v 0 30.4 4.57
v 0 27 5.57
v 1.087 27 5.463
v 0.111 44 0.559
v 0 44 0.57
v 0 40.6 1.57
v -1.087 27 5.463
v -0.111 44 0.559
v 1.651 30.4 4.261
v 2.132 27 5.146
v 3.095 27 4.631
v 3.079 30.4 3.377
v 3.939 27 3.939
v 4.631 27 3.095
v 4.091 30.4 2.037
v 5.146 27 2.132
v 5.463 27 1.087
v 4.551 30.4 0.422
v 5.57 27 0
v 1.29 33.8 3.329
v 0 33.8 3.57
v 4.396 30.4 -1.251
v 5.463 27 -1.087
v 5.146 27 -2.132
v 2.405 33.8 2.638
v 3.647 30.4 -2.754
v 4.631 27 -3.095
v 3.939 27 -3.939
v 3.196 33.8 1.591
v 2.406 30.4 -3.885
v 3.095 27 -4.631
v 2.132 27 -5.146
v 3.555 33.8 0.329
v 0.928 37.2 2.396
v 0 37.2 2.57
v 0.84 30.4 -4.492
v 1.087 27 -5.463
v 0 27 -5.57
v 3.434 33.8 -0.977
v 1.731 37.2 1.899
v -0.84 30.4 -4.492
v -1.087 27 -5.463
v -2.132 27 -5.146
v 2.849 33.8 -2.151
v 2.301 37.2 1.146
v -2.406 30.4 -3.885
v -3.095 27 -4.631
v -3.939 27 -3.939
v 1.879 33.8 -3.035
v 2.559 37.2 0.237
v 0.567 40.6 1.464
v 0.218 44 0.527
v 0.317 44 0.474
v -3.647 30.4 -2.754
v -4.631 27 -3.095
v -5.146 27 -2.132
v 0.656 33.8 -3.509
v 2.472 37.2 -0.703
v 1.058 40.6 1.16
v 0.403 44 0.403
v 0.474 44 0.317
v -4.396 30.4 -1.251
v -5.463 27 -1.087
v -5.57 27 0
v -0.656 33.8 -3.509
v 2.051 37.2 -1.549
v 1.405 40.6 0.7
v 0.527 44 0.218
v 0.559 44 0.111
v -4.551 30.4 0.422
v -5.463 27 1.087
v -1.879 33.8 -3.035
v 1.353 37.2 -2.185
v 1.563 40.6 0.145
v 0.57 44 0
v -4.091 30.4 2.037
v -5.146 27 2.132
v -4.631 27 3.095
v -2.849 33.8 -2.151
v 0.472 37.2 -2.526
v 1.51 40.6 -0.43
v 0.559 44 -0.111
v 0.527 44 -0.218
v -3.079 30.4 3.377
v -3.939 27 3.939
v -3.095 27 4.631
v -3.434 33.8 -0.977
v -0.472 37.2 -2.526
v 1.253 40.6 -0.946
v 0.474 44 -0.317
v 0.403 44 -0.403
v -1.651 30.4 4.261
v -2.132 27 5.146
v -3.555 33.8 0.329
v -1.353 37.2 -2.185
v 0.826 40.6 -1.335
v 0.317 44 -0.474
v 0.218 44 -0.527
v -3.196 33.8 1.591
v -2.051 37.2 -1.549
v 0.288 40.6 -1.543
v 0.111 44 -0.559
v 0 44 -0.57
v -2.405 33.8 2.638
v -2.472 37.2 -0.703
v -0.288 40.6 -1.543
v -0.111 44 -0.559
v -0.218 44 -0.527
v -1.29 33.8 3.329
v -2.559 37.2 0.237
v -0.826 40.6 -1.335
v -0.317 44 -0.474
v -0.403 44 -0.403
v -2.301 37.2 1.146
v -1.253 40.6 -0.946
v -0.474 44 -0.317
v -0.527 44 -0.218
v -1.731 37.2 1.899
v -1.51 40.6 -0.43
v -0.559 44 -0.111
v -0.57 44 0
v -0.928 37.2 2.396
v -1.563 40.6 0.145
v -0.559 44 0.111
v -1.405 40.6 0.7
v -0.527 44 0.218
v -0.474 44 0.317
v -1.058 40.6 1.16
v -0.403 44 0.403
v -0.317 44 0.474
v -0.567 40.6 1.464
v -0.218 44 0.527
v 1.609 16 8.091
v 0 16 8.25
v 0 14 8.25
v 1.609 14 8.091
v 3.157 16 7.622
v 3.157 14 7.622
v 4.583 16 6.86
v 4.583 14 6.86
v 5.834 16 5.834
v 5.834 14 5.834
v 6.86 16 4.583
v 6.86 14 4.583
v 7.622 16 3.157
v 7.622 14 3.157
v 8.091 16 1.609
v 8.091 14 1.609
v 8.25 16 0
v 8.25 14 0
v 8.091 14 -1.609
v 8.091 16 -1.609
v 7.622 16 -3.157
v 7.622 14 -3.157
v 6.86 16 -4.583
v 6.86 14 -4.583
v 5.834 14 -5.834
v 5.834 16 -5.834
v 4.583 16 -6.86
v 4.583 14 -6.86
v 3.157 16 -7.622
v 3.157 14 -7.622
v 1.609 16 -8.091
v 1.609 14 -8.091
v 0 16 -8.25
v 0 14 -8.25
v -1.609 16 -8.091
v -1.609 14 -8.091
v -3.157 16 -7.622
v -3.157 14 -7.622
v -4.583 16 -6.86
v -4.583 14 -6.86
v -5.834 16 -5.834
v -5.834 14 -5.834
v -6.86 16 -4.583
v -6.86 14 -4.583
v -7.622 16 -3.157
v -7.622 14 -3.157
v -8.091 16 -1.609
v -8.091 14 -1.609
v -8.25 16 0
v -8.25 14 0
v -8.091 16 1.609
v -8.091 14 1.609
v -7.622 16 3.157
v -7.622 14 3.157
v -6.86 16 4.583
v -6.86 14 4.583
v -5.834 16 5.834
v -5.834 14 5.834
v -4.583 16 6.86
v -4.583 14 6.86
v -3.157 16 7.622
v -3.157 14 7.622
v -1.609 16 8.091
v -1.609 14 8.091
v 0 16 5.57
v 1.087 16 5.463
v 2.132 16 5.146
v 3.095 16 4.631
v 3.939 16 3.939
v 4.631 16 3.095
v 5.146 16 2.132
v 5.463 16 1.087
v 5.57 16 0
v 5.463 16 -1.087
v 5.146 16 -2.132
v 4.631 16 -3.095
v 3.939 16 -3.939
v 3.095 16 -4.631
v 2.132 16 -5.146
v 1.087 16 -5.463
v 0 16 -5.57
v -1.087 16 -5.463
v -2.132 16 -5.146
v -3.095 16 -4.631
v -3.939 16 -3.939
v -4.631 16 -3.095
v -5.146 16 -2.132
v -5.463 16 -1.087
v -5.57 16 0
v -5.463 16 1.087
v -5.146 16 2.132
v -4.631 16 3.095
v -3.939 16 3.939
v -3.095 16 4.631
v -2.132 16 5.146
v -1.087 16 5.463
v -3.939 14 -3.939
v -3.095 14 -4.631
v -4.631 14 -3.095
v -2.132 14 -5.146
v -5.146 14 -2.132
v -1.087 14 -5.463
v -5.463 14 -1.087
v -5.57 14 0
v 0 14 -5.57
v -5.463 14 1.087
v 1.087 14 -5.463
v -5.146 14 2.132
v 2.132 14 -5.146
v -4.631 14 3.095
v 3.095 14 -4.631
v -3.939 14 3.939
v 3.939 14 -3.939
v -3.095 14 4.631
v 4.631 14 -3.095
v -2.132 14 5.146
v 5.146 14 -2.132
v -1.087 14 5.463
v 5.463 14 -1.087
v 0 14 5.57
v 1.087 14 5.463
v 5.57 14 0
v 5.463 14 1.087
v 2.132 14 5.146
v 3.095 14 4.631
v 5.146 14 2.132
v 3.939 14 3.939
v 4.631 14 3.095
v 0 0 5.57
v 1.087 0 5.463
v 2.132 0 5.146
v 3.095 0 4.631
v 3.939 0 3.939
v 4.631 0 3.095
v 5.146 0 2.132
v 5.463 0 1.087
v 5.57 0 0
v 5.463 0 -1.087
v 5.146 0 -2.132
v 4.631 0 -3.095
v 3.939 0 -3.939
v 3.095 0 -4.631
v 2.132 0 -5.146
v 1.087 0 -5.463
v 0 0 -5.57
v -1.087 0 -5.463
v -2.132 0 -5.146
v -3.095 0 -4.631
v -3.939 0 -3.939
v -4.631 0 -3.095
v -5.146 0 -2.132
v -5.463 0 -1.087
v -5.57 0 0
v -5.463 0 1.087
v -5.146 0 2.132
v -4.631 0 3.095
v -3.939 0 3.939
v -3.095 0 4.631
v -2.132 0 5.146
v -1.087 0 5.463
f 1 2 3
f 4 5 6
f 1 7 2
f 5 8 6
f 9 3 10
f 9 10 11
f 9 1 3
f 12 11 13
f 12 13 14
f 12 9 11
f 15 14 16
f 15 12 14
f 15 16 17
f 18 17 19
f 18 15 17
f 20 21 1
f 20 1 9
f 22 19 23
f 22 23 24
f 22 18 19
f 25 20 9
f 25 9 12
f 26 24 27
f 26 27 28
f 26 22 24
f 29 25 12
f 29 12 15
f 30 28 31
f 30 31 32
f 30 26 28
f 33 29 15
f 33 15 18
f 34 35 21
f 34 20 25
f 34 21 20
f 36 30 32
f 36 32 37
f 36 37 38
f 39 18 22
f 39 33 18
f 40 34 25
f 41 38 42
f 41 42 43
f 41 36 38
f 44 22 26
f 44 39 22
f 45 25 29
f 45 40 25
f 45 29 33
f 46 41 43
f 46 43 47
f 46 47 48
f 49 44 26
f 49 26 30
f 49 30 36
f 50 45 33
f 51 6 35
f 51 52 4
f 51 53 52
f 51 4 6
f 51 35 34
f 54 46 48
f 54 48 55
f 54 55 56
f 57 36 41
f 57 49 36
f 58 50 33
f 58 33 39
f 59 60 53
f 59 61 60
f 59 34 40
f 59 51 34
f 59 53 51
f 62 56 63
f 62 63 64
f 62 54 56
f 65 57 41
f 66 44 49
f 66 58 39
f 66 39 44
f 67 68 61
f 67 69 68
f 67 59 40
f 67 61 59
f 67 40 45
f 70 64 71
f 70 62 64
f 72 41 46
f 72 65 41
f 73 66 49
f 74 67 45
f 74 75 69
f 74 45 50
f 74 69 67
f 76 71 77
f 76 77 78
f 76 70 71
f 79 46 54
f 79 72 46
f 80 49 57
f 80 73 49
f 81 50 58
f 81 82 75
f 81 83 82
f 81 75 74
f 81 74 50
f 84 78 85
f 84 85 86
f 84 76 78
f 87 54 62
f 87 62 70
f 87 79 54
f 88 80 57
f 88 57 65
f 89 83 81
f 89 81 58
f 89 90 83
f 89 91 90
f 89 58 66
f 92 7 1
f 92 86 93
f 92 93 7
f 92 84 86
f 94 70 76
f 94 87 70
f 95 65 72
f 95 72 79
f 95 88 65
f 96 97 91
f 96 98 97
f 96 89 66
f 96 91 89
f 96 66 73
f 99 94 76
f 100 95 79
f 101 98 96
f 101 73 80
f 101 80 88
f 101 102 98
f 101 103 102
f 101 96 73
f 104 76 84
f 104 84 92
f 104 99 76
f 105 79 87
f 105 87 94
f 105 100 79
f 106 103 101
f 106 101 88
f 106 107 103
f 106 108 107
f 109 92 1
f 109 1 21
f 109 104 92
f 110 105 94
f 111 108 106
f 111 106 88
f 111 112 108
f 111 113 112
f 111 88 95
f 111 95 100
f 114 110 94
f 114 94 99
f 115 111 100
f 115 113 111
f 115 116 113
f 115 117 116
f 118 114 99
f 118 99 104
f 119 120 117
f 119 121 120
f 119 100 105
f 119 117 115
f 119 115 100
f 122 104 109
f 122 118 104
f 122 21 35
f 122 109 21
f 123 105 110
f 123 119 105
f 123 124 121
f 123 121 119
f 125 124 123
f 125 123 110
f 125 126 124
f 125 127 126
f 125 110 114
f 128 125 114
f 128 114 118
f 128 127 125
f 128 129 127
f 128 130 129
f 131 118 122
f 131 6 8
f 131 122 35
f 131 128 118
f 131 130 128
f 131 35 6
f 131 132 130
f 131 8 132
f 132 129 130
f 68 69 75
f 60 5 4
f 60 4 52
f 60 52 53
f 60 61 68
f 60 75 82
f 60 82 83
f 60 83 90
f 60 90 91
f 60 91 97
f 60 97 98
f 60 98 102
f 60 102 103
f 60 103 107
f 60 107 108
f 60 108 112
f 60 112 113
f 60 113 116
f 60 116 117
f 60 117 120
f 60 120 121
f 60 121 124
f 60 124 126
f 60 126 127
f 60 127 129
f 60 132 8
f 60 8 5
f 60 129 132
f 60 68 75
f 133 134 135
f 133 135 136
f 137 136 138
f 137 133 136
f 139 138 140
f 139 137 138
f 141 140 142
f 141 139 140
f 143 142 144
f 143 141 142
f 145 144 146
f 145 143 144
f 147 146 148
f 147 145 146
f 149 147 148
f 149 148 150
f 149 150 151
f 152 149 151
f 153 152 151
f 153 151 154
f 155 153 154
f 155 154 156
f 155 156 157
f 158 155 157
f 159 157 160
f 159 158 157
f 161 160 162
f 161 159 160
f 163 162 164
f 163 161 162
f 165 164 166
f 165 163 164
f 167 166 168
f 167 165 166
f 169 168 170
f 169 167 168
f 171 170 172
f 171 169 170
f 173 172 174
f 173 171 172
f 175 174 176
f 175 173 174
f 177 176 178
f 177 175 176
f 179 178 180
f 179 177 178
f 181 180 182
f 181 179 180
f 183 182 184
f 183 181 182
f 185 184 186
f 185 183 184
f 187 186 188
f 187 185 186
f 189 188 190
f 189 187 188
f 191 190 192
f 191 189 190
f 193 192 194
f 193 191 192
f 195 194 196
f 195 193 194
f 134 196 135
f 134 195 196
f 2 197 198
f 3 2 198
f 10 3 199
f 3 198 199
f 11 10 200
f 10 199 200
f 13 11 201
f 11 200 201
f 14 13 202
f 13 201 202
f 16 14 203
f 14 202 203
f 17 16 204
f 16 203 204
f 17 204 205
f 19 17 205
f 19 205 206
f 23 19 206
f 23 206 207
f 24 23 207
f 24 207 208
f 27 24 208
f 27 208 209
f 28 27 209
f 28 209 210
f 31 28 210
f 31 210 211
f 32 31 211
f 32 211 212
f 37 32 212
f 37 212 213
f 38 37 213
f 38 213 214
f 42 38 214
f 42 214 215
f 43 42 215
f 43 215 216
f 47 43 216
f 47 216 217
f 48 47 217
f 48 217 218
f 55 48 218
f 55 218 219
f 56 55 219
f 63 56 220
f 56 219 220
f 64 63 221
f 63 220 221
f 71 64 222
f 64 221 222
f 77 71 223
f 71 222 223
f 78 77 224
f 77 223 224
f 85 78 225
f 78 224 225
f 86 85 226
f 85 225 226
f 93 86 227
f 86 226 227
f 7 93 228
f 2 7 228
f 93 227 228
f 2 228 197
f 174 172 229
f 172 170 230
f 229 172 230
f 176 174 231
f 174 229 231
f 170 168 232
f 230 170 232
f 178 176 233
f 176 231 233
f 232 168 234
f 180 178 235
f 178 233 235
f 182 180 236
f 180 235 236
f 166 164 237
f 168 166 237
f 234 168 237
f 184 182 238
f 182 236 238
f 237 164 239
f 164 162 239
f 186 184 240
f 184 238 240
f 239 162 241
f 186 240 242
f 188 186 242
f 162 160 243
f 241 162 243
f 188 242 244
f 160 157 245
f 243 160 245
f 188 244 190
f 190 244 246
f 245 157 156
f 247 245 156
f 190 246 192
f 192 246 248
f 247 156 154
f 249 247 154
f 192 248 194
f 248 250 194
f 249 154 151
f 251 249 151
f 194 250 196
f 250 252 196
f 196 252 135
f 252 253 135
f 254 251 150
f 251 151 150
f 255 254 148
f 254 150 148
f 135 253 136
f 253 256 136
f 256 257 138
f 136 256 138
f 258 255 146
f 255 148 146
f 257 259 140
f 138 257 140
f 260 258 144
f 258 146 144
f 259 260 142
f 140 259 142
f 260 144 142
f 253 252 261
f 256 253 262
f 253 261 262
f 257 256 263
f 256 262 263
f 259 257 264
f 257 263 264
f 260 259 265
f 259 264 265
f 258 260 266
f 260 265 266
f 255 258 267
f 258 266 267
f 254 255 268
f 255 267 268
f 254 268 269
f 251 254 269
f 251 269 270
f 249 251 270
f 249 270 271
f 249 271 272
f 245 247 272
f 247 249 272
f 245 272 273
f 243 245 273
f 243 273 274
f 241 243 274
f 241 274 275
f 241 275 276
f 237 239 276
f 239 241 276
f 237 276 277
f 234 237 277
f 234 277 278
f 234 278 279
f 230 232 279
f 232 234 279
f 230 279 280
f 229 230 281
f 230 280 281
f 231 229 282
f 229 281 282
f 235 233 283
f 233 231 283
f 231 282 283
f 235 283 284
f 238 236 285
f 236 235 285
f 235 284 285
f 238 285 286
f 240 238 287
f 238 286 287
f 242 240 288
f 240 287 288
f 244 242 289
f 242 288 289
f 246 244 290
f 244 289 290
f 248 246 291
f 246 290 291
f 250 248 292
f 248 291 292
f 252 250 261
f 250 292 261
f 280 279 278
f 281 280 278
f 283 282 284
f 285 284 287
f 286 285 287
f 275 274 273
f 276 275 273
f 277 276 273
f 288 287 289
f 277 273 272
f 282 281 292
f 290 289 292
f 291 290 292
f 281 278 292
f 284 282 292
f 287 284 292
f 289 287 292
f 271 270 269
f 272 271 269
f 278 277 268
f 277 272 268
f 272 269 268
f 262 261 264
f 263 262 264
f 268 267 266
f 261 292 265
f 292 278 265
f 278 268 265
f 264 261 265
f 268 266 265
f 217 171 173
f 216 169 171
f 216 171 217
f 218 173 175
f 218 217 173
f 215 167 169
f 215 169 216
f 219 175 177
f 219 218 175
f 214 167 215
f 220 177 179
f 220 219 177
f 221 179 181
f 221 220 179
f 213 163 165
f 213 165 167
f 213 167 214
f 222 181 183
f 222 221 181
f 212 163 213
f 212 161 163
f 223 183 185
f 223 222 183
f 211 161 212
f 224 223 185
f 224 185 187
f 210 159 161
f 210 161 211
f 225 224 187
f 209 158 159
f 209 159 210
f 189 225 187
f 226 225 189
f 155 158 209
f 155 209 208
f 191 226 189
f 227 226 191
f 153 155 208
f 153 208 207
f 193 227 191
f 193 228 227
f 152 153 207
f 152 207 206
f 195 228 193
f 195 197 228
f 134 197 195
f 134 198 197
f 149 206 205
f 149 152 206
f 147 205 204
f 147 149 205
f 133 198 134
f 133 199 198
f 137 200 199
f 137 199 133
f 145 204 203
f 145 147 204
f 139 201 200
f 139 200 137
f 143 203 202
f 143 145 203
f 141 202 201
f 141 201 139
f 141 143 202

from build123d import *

# Parameters (mm, degrees)
SKETCH1_R           = 5.57
BOSS_EXTRUDE1_DEPTH = 44
CHAMFER1_SIZE       = 17
CHAMFER1_SIZE2      = 5
SKETCH2_R           = 8.25
BOSS_EXTRUDE2_DEPTH = 2


with BuildPart() as part:
    # Sketch1 → Boss-Extrude1 (new body)
    with BuildSketch(Plane(origin=(0, 0, 0), x_dir=(1, 0, 0), z_dir=(0, 1, 0))):
        with Locations(Location((0, 0, 0), (0, 0, 270))):
            Circle(SKETCH1_R)
    extrude(amount=BOSS_EXTRUDE1_DEPTH)

    # Chamfer1
    chamfer1_edges = [part.edges().sort_by_distance(p)[0] for p in [
        (0, 44, -5.57),
    ]]
    chamfer1_side = [part.faces().sort_by_distance(p)[0] for p in [
        (0, 22, -5.57),
    ]]
    chamfer(chamfer1_edges, length=CHAMFER1_SIZE, length2=CHAMFER1_SIZE2, reference=chamfer1_side[0])

    # Sketch2 → Boss-Extrude2 (add)
    with BuildSketch(Plane(origin=(0, 16, 0), x_dir=(1, 0, 0), z_dir=(0, 1, 0))):
        with Locations(Location((0, 0, 0), (0, 0, 270))):
            Circle(SKETCH2_R)
    extrude(amount=-BOSS_EXTRUDE2_DEPTH)


solid = part.part
